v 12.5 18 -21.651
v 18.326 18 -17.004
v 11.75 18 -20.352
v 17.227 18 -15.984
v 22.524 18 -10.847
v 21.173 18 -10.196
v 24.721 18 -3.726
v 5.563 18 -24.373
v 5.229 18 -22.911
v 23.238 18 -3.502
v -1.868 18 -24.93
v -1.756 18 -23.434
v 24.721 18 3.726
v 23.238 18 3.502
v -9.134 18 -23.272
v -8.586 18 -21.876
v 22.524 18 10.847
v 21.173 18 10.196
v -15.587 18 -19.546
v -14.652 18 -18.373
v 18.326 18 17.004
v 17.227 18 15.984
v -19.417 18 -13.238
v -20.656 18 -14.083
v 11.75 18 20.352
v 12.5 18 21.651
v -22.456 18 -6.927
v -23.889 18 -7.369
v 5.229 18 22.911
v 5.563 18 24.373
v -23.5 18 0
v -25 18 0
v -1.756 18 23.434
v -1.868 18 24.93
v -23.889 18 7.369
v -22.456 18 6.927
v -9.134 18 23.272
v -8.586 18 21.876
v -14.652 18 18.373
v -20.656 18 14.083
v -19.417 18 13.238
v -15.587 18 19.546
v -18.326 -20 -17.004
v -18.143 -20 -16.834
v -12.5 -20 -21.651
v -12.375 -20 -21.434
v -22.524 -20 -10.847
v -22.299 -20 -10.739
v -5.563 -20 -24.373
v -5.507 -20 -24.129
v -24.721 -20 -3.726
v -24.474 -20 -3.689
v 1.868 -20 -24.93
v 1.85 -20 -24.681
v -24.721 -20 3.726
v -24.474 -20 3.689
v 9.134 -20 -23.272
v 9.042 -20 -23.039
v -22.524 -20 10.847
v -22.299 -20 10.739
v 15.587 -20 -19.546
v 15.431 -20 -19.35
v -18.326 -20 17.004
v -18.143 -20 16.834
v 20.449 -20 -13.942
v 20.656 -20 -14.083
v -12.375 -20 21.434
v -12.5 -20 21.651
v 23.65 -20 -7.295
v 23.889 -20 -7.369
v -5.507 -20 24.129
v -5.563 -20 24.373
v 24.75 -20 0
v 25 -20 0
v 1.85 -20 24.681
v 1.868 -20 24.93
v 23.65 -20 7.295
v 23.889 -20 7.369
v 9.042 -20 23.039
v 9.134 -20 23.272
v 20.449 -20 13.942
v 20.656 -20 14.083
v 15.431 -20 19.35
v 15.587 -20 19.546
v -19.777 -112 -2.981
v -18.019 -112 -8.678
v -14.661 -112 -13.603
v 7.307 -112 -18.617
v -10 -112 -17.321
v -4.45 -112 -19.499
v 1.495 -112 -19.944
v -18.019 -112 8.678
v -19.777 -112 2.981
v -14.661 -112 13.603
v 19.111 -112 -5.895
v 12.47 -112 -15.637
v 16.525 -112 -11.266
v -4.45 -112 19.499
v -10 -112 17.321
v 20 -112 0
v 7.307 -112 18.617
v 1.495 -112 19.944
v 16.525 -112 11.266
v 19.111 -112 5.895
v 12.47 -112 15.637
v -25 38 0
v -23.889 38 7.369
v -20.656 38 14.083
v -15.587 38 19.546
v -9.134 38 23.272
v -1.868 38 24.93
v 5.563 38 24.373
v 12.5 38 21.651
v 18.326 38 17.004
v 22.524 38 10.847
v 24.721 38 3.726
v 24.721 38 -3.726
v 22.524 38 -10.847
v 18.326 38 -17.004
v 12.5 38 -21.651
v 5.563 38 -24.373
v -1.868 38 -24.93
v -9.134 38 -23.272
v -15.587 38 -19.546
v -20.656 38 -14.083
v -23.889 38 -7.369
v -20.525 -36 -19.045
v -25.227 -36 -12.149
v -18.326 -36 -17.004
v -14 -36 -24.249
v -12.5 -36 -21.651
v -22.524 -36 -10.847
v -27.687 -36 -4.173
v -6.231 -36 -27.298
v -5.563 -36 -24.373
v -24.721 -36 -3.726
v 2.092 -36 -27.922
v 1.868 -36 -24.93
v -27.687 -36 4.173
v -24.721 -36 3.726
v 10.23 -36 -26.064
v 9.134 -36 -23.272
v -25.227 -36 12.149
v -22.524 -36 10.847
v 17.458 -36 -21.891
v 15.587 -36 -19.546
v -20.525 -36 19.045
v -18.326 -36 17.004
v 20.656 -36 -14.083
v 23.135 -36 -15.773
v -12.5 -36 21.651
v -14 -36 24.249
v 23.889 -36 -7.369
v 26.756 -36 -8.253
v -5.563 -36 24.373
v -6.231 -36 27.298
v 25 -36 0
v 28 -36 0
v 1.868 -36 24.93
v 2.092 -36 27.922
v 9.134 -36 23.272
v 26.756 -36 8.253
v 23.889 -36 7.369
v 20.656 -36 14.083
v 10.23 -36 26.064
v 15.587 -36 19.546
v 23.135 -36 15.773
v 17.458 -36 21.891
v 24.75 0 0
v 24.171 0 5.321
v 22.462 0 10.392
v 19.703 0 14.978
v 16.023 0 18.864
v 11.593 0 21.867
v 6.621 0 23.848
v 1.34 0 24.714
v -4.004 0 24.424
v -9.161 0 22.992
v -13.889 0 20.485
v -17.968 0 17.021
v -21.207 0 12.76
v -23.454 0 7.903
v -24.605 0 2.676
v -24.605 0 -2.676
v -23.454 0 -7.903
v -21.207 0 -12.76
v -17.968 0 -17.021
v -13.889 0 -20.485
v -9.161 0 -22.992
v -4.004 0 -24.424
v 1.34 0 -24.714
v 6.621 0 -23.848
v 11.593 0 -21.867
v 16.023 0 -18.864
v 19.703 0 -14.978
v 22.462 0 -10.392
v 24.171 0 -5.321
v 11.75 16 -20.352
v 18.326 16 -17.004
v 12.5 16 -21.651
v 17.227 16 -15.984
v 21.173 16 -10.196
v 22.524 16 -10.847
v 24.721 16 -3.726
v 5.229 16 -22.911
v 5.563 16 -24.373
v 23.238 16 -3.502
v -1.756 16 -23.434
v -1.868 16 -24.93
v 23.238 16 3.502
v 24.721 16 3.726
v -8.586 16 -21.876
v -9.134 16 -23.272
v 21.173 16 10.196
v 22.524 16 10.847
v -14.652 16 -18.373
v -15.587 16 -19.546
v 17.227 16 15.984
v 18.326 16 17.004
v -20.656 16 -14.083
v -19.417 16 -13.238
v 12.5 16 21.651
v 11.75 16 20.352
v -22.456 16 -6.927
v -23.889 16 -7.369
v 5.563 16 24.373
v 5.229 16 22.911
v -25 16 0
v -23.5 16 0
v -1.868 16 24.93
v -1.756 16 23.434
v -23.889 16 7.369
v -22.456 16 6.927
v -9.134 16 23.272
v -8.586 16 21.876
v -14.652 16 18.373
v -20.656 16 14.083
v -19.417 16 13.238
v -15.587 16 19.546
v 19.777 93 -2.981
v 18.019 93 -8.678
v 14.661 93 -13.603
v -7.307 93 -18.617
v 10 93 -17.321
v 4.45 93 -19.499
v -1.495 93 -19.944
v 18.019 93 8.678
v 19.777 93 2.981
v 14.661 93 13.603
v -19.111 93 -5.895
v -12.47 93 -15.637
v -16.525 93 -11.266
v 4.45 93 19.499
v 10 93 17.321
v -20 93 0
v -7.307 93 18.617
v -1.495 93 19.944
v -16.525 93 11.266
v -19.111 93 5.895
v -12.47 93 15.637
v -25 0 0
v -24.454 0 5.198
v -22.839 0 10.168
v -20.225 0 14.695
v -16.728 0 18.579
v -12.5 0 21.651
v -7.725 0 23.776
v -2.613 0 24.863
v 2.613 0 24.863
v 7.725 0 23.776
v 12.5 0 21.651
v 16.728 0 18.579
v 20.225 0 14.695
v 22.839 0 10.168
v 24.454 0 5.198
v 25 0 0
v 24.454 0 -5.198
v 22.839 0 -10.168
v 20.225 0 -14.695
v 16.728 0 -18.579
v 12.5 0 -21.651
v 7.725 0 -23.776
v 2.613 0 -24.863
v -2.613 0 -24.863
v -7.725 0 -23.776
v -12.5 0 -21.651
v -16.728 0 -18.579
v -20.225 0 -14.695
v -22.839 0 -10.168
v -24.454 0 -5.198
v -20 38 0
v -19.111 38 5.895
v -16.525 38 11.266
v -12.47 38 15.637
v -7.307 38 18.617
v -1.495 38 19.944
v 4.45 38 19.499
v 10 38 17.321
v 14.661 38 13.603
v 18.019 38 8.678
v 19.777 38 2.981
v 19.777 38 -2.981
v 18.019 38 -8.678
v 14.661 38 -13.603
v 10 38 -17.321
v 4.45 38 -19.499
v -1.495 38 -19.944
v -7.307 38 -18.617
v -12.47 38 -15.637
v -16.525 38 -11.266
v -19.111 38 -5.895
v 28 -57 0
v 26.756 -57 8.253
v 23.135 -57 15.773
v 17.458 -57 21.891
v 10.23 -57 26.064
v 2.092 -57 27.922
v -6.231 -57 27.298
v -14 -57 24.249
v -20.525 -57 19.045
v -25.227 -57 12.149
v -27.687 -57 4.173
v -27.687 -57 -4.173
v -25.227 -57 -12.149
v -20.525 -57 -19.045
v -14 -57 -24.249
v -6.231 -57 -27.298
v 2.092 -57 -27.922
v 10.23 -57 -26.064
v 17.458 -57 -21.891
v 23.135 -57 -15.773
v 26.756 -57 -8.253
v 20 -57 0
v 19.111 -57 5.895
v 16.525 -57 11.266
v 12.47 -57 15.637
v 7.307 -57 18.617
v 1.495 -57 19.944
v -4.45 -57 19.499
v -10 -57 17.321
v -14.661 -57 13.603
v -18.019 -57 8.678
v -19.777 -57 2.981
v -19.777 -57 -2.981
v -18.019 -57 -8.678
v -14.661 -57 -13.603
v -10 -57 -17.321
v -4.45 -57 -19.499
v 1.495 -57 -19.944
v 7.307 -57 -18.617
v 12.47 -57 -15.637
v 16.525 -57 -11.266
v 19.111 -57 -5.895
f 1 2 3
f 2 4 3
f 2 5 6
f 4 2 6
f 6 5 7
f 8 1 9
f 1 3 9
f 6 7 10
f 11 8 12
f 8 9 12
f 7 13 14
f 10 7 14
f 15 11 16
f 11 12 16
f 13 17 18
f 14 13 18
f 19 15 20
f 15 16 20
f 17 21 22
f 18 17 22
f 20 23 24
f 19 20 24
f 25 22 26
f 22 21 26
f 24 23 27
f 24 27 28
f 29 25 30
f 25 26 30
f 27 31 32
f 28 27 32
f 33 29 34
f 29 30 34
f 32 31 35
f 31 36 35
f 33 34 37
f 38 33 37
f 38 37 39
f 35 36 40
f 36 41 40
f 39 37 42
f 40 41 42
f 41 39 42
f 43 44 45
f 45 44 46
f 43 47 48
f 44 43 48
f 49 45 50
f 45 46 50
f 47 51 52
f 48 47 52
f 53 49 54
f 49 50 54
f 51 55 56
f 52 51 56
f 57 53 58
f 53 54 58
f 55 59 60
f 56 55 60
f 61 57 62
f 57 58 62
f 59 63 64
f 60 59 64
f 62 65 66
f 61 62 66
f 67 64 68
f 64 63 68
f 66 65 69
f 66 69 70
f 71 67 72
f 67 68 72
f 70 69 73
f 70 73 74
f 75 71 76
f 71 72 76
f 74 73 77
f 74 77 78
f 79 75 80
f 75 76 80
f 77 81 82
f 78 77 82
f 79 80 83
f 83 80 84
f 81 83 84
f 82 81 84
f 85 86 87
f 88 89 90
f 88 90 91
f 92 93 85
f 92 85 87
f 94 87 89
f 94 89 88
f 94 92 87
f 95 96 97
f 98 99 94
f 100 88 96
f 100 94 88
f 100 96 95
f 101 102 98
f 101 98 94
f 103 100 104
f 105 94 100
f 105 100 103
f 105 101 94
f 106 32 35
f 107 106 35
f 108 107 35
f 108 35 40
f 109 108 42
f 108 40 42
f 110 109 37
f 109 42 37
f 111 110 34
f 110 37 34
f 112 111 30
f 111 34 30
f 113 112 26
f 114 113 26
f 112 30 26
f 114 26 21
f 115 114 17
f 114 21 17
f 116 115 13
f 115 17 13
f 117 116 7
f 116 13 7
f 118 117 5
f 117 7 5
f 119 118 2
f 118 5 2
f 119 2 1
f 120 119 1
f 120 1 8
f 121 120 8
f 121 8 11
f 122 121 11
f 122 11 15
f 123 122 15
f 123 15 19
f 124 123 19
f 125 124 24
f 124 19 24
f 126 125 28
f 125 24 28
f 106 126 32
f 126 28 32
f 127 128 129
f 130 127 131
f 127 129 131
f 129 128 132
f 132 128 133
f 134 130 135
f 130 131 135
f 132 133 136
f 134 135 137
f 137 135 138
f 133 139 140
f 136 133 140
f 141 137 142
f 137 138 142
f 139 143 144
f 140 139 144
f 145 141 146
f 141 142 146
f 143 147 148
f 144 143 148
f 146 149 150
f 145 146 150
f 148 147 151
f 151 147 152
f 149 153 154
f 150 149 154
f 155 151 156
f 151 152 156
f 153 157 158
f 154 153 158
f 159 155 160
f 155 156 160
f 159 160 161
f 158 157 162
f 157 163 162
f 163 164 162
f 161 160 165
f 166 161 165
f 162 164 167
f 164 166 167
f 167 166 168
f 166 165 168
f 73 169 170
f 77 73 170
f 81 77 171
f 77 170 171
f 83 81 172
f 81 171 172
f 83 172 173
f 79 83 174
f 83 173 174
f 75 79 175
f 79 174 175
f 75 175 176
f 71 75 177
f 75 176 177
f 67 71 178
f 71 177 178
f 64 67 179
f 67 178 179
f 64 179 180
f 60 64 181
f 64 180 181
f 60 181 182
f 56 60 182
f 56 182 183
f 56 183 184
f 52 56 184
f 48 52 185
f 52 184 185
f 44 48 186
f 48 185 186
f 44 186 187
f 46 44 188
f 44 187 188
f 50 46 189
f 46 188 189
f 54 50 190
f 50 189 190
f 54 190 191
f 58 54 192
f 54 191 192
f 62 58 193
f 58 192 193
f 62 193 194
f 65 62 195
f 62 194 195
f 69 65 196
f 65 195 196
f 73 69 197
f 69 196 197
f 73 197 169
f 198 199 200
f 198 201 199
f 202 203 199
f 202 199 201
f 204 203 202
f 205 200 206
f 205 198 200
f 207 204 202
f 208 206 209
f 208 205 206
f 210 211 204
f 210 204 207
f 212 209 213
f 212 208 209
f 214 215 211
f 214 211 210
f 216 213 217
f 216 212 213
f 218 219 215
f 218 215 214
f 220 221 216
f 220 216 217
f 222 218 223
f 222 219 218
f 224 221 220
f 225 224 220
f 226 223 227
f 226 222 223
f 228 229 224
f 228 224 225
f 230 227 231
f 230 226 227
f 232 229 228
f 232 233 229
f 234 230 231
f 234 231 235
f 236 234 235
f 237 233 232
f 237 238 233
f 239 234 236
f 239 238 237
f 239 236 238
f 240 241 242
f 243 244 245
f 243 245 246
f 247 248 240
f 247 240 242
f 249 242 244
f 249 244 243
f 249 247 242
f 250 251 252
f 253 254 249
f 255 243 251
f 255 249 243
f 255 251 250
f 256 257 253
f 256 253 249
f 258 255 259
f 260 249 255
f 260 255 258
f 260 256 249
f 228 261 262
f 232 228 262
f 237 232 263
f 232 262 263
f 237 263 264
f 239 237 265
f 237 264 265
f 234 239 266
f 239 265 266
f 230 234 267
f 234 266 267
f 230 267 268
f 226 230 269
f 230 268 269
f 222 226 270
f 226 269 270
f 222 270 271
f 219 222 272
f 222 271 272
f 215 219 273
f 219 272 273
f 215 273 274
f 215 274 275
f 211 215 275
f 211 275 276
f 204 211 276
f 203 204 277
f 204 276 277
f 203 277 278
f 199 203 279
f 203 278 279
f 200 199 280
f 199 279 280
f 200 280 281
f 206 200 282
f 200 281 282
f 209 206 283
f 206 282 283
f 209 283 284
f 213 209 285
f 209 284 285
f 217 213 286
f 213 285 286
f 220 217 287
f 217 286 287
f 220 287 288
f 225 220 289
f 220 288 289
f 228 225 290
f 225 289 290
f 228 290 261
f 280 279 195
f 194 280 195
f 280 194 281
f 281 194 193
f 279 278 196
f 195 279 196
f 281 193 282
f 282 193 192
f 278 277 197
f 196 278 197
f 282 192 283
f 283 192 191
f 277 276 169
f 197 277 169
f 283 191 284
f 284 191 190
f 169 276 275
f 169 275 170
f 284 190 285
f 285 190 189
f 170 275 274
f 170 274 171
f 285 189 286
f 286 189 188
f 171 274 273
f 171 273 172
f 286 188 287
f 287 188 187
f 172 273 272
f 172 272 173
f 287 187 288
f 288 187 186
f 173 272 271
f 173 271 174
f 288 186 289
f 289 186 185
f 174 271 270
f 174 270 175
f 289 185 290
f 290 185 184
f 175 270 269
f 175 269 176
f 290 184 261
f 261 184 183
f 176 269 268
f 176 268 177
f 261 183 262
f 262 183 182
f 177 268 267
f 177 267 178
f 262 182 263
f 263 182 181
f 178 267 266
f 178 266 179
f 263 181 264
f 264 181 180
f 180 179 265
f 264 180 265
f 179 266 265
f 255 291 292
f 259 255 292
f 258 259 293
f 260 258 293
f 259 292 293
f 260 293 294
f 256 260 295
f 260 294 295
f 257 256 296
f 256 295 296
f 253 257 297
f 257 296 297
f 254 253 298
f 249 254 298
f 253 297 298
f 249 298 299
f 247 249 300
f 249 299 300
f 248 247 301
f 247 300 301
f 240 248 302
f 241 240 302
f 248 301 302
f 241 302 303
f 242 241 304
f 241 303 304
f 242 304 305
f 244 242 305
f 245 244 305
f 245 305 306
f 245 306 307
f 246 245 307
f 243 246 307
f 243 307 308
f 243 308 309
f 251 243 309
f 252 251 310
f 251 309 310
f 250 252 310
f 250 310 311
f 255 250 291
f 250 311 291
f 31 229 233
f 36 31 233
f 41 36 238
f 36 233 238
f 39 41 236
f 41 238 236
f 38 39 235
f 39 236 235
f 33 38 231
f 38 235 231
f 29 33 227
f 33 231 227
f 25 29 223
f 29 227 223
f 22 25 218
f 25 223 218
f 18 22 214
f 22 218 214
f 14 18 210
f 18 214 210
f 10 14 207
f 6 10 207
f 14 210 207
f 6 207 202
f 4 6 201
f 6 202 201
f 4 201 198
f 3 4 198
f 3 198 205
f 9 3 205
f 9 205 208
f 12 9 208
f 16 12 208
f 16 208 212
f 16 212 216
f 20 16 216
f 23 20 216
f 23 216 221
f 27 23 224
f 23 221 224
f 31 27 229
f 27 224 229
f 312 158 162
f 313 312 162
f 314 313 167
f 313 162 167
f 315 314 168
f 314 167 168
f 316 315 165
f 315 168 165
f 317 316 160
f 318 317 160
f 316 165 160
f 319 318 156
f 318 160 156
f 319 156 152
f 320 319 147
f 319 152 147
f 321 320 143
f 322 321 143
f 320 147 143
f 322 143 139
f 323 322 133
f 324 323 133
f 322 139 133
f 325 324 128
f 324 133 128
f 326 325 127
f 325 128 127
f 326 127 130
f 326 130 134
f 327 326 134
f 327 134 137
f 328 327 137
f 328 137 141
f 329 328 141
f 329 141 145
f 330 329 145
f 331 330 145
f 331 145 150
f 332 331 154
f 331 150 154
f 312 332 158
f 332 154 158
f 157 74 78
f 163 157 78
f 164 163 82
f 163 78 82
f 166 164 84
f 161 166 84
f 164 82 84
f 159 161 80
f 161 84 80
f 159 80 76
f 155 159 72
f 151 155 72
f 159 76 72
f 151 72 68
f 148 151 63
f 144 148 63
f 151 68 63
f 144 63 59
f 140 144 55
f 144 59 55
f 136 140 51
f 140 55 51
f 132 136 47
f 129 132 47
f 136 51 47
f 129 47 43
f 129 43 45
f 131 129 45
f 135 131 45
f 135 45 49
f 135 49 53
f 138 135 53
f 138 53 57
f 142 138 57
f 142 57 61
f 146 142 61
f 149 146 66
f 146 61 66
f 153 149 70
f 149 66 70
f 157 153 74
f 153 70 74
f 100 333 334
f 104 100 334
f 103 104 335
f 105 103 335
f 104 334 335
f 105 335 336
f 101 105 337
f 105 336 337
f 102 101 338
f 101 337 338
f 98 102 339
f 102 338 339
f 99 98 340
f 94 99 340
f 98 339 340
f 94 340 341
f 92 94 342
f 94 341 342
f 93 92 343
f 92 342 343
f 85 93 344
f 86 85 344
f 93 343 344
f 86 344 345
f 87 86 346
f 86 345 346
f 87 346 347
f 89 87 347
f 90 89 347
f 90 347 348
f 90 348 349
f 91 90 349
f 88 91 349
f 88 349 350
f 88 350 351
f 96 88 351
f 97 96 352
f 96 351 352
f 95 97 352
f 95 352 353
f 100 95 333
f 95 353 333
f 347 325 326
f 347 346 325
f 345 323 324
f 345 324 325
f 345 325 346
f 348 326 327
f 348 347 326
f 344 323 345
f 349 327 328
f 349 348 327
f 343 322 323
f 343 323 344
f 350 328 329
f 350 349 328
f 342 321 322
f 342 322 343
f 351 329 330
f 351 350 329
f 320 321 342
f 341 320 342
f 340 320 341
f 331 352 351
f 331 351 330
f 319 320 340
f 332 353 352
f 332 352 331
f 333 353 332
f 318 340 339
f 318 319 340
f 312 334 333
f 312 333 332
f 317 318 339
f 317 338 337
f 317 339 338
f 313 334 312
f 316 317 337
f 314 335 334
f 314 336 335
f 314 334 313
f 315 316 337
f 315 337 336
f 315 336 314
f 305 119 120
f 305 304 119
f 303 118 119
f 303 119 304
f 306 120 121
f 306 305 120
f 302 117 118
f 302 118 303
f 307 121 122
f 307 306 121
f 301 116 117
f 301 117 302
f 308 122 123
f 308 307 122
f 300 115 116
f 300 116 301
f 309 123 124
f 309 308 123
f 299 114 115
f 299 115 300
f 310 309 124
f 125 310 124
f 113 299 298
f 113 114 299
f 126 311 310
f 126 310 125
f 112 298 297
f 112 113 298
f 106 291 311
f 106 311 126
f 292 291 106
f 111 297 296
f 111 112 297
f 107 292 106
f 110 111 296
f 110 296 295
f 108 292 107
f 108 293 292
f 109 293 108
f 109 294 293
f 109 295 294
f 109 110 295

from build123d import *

# Parameters (mm, degrees)
F0_R      = 24.75
F1_DEPTH  = 20
F2_R      = 25
F3_DEPTH  = 16
F4_R      = 25
F5_DEPTH  = 16
F6_R      = 28
F7_DEPTH  = 21
F8_R      = 20
F9_DEPTH  = 55
F10_R     = 23.5
F11_DEPTH = 2
F12_R     = 25
F13_DEPTH = 20
F14_R     = 20
F15_DEPTH = 55


with BuildPart() as f1:
    # F0 (on Front) → F1 (new body)
    with BuildSketch(Plane.XZ):
        Circle(F0_R)
    extrude(amount=F1_DEPTH)

    # F2 (on face) → F3 (join)
    with BuildSketch(Plane.XZ.offset(20)):
        Circle(F2_R)
    extrude(amount=F3_DEPTH)

    # F4 (on face) → F5 (join)
    with BuildSketch(Plane(origin=(0, 0, 0), x_dir=(-1, 0, 0), z_dir=(0, 1, 0))):
        Circle(F4_R)
    extrude(amount=F5_DEPTH)

    # F6 (on face) → F7 (join)
    with BuildSketch(Plane.XZ.offset(36)):
        Circle(F6_R)
    extrude(amount=F7_DEPTH)

    # F8 (on face) → F9 (join)
    with BuildSketch(Plane.XZ.offset(57)):
        Circle(F8_R)
    extrude(amount=F9_DEPTH)

    # F10 (on face) → F11 (join)
    with BuildSketch(Plane(origin=(0, 16, 0), x_dir=(-1, 0, 0), z_dir=(0, 1, 0))):
        Circle(F10_R)
    extrude(amount=F11_DEPTH)

    # F12 (on face) → F13 (join)
    with BuildSketch(Plane(origin=(0, 18, 0), x_dir=(-1, 0, 0), z_dir=(0, 1, 0))):
        Circle(F12_R)
    extrude(amount=F13_DEPTH)

    # F14 (on face) → F15 (join)
    with BuildSketch(Plane(origin=(0, 38, 0), x_dir=(-1, 0, 0), z_dir=(0, 1, 0))):
        Circle(F14_R)
    extrude(amount=F15_DEPTH)


solid = f1.part
